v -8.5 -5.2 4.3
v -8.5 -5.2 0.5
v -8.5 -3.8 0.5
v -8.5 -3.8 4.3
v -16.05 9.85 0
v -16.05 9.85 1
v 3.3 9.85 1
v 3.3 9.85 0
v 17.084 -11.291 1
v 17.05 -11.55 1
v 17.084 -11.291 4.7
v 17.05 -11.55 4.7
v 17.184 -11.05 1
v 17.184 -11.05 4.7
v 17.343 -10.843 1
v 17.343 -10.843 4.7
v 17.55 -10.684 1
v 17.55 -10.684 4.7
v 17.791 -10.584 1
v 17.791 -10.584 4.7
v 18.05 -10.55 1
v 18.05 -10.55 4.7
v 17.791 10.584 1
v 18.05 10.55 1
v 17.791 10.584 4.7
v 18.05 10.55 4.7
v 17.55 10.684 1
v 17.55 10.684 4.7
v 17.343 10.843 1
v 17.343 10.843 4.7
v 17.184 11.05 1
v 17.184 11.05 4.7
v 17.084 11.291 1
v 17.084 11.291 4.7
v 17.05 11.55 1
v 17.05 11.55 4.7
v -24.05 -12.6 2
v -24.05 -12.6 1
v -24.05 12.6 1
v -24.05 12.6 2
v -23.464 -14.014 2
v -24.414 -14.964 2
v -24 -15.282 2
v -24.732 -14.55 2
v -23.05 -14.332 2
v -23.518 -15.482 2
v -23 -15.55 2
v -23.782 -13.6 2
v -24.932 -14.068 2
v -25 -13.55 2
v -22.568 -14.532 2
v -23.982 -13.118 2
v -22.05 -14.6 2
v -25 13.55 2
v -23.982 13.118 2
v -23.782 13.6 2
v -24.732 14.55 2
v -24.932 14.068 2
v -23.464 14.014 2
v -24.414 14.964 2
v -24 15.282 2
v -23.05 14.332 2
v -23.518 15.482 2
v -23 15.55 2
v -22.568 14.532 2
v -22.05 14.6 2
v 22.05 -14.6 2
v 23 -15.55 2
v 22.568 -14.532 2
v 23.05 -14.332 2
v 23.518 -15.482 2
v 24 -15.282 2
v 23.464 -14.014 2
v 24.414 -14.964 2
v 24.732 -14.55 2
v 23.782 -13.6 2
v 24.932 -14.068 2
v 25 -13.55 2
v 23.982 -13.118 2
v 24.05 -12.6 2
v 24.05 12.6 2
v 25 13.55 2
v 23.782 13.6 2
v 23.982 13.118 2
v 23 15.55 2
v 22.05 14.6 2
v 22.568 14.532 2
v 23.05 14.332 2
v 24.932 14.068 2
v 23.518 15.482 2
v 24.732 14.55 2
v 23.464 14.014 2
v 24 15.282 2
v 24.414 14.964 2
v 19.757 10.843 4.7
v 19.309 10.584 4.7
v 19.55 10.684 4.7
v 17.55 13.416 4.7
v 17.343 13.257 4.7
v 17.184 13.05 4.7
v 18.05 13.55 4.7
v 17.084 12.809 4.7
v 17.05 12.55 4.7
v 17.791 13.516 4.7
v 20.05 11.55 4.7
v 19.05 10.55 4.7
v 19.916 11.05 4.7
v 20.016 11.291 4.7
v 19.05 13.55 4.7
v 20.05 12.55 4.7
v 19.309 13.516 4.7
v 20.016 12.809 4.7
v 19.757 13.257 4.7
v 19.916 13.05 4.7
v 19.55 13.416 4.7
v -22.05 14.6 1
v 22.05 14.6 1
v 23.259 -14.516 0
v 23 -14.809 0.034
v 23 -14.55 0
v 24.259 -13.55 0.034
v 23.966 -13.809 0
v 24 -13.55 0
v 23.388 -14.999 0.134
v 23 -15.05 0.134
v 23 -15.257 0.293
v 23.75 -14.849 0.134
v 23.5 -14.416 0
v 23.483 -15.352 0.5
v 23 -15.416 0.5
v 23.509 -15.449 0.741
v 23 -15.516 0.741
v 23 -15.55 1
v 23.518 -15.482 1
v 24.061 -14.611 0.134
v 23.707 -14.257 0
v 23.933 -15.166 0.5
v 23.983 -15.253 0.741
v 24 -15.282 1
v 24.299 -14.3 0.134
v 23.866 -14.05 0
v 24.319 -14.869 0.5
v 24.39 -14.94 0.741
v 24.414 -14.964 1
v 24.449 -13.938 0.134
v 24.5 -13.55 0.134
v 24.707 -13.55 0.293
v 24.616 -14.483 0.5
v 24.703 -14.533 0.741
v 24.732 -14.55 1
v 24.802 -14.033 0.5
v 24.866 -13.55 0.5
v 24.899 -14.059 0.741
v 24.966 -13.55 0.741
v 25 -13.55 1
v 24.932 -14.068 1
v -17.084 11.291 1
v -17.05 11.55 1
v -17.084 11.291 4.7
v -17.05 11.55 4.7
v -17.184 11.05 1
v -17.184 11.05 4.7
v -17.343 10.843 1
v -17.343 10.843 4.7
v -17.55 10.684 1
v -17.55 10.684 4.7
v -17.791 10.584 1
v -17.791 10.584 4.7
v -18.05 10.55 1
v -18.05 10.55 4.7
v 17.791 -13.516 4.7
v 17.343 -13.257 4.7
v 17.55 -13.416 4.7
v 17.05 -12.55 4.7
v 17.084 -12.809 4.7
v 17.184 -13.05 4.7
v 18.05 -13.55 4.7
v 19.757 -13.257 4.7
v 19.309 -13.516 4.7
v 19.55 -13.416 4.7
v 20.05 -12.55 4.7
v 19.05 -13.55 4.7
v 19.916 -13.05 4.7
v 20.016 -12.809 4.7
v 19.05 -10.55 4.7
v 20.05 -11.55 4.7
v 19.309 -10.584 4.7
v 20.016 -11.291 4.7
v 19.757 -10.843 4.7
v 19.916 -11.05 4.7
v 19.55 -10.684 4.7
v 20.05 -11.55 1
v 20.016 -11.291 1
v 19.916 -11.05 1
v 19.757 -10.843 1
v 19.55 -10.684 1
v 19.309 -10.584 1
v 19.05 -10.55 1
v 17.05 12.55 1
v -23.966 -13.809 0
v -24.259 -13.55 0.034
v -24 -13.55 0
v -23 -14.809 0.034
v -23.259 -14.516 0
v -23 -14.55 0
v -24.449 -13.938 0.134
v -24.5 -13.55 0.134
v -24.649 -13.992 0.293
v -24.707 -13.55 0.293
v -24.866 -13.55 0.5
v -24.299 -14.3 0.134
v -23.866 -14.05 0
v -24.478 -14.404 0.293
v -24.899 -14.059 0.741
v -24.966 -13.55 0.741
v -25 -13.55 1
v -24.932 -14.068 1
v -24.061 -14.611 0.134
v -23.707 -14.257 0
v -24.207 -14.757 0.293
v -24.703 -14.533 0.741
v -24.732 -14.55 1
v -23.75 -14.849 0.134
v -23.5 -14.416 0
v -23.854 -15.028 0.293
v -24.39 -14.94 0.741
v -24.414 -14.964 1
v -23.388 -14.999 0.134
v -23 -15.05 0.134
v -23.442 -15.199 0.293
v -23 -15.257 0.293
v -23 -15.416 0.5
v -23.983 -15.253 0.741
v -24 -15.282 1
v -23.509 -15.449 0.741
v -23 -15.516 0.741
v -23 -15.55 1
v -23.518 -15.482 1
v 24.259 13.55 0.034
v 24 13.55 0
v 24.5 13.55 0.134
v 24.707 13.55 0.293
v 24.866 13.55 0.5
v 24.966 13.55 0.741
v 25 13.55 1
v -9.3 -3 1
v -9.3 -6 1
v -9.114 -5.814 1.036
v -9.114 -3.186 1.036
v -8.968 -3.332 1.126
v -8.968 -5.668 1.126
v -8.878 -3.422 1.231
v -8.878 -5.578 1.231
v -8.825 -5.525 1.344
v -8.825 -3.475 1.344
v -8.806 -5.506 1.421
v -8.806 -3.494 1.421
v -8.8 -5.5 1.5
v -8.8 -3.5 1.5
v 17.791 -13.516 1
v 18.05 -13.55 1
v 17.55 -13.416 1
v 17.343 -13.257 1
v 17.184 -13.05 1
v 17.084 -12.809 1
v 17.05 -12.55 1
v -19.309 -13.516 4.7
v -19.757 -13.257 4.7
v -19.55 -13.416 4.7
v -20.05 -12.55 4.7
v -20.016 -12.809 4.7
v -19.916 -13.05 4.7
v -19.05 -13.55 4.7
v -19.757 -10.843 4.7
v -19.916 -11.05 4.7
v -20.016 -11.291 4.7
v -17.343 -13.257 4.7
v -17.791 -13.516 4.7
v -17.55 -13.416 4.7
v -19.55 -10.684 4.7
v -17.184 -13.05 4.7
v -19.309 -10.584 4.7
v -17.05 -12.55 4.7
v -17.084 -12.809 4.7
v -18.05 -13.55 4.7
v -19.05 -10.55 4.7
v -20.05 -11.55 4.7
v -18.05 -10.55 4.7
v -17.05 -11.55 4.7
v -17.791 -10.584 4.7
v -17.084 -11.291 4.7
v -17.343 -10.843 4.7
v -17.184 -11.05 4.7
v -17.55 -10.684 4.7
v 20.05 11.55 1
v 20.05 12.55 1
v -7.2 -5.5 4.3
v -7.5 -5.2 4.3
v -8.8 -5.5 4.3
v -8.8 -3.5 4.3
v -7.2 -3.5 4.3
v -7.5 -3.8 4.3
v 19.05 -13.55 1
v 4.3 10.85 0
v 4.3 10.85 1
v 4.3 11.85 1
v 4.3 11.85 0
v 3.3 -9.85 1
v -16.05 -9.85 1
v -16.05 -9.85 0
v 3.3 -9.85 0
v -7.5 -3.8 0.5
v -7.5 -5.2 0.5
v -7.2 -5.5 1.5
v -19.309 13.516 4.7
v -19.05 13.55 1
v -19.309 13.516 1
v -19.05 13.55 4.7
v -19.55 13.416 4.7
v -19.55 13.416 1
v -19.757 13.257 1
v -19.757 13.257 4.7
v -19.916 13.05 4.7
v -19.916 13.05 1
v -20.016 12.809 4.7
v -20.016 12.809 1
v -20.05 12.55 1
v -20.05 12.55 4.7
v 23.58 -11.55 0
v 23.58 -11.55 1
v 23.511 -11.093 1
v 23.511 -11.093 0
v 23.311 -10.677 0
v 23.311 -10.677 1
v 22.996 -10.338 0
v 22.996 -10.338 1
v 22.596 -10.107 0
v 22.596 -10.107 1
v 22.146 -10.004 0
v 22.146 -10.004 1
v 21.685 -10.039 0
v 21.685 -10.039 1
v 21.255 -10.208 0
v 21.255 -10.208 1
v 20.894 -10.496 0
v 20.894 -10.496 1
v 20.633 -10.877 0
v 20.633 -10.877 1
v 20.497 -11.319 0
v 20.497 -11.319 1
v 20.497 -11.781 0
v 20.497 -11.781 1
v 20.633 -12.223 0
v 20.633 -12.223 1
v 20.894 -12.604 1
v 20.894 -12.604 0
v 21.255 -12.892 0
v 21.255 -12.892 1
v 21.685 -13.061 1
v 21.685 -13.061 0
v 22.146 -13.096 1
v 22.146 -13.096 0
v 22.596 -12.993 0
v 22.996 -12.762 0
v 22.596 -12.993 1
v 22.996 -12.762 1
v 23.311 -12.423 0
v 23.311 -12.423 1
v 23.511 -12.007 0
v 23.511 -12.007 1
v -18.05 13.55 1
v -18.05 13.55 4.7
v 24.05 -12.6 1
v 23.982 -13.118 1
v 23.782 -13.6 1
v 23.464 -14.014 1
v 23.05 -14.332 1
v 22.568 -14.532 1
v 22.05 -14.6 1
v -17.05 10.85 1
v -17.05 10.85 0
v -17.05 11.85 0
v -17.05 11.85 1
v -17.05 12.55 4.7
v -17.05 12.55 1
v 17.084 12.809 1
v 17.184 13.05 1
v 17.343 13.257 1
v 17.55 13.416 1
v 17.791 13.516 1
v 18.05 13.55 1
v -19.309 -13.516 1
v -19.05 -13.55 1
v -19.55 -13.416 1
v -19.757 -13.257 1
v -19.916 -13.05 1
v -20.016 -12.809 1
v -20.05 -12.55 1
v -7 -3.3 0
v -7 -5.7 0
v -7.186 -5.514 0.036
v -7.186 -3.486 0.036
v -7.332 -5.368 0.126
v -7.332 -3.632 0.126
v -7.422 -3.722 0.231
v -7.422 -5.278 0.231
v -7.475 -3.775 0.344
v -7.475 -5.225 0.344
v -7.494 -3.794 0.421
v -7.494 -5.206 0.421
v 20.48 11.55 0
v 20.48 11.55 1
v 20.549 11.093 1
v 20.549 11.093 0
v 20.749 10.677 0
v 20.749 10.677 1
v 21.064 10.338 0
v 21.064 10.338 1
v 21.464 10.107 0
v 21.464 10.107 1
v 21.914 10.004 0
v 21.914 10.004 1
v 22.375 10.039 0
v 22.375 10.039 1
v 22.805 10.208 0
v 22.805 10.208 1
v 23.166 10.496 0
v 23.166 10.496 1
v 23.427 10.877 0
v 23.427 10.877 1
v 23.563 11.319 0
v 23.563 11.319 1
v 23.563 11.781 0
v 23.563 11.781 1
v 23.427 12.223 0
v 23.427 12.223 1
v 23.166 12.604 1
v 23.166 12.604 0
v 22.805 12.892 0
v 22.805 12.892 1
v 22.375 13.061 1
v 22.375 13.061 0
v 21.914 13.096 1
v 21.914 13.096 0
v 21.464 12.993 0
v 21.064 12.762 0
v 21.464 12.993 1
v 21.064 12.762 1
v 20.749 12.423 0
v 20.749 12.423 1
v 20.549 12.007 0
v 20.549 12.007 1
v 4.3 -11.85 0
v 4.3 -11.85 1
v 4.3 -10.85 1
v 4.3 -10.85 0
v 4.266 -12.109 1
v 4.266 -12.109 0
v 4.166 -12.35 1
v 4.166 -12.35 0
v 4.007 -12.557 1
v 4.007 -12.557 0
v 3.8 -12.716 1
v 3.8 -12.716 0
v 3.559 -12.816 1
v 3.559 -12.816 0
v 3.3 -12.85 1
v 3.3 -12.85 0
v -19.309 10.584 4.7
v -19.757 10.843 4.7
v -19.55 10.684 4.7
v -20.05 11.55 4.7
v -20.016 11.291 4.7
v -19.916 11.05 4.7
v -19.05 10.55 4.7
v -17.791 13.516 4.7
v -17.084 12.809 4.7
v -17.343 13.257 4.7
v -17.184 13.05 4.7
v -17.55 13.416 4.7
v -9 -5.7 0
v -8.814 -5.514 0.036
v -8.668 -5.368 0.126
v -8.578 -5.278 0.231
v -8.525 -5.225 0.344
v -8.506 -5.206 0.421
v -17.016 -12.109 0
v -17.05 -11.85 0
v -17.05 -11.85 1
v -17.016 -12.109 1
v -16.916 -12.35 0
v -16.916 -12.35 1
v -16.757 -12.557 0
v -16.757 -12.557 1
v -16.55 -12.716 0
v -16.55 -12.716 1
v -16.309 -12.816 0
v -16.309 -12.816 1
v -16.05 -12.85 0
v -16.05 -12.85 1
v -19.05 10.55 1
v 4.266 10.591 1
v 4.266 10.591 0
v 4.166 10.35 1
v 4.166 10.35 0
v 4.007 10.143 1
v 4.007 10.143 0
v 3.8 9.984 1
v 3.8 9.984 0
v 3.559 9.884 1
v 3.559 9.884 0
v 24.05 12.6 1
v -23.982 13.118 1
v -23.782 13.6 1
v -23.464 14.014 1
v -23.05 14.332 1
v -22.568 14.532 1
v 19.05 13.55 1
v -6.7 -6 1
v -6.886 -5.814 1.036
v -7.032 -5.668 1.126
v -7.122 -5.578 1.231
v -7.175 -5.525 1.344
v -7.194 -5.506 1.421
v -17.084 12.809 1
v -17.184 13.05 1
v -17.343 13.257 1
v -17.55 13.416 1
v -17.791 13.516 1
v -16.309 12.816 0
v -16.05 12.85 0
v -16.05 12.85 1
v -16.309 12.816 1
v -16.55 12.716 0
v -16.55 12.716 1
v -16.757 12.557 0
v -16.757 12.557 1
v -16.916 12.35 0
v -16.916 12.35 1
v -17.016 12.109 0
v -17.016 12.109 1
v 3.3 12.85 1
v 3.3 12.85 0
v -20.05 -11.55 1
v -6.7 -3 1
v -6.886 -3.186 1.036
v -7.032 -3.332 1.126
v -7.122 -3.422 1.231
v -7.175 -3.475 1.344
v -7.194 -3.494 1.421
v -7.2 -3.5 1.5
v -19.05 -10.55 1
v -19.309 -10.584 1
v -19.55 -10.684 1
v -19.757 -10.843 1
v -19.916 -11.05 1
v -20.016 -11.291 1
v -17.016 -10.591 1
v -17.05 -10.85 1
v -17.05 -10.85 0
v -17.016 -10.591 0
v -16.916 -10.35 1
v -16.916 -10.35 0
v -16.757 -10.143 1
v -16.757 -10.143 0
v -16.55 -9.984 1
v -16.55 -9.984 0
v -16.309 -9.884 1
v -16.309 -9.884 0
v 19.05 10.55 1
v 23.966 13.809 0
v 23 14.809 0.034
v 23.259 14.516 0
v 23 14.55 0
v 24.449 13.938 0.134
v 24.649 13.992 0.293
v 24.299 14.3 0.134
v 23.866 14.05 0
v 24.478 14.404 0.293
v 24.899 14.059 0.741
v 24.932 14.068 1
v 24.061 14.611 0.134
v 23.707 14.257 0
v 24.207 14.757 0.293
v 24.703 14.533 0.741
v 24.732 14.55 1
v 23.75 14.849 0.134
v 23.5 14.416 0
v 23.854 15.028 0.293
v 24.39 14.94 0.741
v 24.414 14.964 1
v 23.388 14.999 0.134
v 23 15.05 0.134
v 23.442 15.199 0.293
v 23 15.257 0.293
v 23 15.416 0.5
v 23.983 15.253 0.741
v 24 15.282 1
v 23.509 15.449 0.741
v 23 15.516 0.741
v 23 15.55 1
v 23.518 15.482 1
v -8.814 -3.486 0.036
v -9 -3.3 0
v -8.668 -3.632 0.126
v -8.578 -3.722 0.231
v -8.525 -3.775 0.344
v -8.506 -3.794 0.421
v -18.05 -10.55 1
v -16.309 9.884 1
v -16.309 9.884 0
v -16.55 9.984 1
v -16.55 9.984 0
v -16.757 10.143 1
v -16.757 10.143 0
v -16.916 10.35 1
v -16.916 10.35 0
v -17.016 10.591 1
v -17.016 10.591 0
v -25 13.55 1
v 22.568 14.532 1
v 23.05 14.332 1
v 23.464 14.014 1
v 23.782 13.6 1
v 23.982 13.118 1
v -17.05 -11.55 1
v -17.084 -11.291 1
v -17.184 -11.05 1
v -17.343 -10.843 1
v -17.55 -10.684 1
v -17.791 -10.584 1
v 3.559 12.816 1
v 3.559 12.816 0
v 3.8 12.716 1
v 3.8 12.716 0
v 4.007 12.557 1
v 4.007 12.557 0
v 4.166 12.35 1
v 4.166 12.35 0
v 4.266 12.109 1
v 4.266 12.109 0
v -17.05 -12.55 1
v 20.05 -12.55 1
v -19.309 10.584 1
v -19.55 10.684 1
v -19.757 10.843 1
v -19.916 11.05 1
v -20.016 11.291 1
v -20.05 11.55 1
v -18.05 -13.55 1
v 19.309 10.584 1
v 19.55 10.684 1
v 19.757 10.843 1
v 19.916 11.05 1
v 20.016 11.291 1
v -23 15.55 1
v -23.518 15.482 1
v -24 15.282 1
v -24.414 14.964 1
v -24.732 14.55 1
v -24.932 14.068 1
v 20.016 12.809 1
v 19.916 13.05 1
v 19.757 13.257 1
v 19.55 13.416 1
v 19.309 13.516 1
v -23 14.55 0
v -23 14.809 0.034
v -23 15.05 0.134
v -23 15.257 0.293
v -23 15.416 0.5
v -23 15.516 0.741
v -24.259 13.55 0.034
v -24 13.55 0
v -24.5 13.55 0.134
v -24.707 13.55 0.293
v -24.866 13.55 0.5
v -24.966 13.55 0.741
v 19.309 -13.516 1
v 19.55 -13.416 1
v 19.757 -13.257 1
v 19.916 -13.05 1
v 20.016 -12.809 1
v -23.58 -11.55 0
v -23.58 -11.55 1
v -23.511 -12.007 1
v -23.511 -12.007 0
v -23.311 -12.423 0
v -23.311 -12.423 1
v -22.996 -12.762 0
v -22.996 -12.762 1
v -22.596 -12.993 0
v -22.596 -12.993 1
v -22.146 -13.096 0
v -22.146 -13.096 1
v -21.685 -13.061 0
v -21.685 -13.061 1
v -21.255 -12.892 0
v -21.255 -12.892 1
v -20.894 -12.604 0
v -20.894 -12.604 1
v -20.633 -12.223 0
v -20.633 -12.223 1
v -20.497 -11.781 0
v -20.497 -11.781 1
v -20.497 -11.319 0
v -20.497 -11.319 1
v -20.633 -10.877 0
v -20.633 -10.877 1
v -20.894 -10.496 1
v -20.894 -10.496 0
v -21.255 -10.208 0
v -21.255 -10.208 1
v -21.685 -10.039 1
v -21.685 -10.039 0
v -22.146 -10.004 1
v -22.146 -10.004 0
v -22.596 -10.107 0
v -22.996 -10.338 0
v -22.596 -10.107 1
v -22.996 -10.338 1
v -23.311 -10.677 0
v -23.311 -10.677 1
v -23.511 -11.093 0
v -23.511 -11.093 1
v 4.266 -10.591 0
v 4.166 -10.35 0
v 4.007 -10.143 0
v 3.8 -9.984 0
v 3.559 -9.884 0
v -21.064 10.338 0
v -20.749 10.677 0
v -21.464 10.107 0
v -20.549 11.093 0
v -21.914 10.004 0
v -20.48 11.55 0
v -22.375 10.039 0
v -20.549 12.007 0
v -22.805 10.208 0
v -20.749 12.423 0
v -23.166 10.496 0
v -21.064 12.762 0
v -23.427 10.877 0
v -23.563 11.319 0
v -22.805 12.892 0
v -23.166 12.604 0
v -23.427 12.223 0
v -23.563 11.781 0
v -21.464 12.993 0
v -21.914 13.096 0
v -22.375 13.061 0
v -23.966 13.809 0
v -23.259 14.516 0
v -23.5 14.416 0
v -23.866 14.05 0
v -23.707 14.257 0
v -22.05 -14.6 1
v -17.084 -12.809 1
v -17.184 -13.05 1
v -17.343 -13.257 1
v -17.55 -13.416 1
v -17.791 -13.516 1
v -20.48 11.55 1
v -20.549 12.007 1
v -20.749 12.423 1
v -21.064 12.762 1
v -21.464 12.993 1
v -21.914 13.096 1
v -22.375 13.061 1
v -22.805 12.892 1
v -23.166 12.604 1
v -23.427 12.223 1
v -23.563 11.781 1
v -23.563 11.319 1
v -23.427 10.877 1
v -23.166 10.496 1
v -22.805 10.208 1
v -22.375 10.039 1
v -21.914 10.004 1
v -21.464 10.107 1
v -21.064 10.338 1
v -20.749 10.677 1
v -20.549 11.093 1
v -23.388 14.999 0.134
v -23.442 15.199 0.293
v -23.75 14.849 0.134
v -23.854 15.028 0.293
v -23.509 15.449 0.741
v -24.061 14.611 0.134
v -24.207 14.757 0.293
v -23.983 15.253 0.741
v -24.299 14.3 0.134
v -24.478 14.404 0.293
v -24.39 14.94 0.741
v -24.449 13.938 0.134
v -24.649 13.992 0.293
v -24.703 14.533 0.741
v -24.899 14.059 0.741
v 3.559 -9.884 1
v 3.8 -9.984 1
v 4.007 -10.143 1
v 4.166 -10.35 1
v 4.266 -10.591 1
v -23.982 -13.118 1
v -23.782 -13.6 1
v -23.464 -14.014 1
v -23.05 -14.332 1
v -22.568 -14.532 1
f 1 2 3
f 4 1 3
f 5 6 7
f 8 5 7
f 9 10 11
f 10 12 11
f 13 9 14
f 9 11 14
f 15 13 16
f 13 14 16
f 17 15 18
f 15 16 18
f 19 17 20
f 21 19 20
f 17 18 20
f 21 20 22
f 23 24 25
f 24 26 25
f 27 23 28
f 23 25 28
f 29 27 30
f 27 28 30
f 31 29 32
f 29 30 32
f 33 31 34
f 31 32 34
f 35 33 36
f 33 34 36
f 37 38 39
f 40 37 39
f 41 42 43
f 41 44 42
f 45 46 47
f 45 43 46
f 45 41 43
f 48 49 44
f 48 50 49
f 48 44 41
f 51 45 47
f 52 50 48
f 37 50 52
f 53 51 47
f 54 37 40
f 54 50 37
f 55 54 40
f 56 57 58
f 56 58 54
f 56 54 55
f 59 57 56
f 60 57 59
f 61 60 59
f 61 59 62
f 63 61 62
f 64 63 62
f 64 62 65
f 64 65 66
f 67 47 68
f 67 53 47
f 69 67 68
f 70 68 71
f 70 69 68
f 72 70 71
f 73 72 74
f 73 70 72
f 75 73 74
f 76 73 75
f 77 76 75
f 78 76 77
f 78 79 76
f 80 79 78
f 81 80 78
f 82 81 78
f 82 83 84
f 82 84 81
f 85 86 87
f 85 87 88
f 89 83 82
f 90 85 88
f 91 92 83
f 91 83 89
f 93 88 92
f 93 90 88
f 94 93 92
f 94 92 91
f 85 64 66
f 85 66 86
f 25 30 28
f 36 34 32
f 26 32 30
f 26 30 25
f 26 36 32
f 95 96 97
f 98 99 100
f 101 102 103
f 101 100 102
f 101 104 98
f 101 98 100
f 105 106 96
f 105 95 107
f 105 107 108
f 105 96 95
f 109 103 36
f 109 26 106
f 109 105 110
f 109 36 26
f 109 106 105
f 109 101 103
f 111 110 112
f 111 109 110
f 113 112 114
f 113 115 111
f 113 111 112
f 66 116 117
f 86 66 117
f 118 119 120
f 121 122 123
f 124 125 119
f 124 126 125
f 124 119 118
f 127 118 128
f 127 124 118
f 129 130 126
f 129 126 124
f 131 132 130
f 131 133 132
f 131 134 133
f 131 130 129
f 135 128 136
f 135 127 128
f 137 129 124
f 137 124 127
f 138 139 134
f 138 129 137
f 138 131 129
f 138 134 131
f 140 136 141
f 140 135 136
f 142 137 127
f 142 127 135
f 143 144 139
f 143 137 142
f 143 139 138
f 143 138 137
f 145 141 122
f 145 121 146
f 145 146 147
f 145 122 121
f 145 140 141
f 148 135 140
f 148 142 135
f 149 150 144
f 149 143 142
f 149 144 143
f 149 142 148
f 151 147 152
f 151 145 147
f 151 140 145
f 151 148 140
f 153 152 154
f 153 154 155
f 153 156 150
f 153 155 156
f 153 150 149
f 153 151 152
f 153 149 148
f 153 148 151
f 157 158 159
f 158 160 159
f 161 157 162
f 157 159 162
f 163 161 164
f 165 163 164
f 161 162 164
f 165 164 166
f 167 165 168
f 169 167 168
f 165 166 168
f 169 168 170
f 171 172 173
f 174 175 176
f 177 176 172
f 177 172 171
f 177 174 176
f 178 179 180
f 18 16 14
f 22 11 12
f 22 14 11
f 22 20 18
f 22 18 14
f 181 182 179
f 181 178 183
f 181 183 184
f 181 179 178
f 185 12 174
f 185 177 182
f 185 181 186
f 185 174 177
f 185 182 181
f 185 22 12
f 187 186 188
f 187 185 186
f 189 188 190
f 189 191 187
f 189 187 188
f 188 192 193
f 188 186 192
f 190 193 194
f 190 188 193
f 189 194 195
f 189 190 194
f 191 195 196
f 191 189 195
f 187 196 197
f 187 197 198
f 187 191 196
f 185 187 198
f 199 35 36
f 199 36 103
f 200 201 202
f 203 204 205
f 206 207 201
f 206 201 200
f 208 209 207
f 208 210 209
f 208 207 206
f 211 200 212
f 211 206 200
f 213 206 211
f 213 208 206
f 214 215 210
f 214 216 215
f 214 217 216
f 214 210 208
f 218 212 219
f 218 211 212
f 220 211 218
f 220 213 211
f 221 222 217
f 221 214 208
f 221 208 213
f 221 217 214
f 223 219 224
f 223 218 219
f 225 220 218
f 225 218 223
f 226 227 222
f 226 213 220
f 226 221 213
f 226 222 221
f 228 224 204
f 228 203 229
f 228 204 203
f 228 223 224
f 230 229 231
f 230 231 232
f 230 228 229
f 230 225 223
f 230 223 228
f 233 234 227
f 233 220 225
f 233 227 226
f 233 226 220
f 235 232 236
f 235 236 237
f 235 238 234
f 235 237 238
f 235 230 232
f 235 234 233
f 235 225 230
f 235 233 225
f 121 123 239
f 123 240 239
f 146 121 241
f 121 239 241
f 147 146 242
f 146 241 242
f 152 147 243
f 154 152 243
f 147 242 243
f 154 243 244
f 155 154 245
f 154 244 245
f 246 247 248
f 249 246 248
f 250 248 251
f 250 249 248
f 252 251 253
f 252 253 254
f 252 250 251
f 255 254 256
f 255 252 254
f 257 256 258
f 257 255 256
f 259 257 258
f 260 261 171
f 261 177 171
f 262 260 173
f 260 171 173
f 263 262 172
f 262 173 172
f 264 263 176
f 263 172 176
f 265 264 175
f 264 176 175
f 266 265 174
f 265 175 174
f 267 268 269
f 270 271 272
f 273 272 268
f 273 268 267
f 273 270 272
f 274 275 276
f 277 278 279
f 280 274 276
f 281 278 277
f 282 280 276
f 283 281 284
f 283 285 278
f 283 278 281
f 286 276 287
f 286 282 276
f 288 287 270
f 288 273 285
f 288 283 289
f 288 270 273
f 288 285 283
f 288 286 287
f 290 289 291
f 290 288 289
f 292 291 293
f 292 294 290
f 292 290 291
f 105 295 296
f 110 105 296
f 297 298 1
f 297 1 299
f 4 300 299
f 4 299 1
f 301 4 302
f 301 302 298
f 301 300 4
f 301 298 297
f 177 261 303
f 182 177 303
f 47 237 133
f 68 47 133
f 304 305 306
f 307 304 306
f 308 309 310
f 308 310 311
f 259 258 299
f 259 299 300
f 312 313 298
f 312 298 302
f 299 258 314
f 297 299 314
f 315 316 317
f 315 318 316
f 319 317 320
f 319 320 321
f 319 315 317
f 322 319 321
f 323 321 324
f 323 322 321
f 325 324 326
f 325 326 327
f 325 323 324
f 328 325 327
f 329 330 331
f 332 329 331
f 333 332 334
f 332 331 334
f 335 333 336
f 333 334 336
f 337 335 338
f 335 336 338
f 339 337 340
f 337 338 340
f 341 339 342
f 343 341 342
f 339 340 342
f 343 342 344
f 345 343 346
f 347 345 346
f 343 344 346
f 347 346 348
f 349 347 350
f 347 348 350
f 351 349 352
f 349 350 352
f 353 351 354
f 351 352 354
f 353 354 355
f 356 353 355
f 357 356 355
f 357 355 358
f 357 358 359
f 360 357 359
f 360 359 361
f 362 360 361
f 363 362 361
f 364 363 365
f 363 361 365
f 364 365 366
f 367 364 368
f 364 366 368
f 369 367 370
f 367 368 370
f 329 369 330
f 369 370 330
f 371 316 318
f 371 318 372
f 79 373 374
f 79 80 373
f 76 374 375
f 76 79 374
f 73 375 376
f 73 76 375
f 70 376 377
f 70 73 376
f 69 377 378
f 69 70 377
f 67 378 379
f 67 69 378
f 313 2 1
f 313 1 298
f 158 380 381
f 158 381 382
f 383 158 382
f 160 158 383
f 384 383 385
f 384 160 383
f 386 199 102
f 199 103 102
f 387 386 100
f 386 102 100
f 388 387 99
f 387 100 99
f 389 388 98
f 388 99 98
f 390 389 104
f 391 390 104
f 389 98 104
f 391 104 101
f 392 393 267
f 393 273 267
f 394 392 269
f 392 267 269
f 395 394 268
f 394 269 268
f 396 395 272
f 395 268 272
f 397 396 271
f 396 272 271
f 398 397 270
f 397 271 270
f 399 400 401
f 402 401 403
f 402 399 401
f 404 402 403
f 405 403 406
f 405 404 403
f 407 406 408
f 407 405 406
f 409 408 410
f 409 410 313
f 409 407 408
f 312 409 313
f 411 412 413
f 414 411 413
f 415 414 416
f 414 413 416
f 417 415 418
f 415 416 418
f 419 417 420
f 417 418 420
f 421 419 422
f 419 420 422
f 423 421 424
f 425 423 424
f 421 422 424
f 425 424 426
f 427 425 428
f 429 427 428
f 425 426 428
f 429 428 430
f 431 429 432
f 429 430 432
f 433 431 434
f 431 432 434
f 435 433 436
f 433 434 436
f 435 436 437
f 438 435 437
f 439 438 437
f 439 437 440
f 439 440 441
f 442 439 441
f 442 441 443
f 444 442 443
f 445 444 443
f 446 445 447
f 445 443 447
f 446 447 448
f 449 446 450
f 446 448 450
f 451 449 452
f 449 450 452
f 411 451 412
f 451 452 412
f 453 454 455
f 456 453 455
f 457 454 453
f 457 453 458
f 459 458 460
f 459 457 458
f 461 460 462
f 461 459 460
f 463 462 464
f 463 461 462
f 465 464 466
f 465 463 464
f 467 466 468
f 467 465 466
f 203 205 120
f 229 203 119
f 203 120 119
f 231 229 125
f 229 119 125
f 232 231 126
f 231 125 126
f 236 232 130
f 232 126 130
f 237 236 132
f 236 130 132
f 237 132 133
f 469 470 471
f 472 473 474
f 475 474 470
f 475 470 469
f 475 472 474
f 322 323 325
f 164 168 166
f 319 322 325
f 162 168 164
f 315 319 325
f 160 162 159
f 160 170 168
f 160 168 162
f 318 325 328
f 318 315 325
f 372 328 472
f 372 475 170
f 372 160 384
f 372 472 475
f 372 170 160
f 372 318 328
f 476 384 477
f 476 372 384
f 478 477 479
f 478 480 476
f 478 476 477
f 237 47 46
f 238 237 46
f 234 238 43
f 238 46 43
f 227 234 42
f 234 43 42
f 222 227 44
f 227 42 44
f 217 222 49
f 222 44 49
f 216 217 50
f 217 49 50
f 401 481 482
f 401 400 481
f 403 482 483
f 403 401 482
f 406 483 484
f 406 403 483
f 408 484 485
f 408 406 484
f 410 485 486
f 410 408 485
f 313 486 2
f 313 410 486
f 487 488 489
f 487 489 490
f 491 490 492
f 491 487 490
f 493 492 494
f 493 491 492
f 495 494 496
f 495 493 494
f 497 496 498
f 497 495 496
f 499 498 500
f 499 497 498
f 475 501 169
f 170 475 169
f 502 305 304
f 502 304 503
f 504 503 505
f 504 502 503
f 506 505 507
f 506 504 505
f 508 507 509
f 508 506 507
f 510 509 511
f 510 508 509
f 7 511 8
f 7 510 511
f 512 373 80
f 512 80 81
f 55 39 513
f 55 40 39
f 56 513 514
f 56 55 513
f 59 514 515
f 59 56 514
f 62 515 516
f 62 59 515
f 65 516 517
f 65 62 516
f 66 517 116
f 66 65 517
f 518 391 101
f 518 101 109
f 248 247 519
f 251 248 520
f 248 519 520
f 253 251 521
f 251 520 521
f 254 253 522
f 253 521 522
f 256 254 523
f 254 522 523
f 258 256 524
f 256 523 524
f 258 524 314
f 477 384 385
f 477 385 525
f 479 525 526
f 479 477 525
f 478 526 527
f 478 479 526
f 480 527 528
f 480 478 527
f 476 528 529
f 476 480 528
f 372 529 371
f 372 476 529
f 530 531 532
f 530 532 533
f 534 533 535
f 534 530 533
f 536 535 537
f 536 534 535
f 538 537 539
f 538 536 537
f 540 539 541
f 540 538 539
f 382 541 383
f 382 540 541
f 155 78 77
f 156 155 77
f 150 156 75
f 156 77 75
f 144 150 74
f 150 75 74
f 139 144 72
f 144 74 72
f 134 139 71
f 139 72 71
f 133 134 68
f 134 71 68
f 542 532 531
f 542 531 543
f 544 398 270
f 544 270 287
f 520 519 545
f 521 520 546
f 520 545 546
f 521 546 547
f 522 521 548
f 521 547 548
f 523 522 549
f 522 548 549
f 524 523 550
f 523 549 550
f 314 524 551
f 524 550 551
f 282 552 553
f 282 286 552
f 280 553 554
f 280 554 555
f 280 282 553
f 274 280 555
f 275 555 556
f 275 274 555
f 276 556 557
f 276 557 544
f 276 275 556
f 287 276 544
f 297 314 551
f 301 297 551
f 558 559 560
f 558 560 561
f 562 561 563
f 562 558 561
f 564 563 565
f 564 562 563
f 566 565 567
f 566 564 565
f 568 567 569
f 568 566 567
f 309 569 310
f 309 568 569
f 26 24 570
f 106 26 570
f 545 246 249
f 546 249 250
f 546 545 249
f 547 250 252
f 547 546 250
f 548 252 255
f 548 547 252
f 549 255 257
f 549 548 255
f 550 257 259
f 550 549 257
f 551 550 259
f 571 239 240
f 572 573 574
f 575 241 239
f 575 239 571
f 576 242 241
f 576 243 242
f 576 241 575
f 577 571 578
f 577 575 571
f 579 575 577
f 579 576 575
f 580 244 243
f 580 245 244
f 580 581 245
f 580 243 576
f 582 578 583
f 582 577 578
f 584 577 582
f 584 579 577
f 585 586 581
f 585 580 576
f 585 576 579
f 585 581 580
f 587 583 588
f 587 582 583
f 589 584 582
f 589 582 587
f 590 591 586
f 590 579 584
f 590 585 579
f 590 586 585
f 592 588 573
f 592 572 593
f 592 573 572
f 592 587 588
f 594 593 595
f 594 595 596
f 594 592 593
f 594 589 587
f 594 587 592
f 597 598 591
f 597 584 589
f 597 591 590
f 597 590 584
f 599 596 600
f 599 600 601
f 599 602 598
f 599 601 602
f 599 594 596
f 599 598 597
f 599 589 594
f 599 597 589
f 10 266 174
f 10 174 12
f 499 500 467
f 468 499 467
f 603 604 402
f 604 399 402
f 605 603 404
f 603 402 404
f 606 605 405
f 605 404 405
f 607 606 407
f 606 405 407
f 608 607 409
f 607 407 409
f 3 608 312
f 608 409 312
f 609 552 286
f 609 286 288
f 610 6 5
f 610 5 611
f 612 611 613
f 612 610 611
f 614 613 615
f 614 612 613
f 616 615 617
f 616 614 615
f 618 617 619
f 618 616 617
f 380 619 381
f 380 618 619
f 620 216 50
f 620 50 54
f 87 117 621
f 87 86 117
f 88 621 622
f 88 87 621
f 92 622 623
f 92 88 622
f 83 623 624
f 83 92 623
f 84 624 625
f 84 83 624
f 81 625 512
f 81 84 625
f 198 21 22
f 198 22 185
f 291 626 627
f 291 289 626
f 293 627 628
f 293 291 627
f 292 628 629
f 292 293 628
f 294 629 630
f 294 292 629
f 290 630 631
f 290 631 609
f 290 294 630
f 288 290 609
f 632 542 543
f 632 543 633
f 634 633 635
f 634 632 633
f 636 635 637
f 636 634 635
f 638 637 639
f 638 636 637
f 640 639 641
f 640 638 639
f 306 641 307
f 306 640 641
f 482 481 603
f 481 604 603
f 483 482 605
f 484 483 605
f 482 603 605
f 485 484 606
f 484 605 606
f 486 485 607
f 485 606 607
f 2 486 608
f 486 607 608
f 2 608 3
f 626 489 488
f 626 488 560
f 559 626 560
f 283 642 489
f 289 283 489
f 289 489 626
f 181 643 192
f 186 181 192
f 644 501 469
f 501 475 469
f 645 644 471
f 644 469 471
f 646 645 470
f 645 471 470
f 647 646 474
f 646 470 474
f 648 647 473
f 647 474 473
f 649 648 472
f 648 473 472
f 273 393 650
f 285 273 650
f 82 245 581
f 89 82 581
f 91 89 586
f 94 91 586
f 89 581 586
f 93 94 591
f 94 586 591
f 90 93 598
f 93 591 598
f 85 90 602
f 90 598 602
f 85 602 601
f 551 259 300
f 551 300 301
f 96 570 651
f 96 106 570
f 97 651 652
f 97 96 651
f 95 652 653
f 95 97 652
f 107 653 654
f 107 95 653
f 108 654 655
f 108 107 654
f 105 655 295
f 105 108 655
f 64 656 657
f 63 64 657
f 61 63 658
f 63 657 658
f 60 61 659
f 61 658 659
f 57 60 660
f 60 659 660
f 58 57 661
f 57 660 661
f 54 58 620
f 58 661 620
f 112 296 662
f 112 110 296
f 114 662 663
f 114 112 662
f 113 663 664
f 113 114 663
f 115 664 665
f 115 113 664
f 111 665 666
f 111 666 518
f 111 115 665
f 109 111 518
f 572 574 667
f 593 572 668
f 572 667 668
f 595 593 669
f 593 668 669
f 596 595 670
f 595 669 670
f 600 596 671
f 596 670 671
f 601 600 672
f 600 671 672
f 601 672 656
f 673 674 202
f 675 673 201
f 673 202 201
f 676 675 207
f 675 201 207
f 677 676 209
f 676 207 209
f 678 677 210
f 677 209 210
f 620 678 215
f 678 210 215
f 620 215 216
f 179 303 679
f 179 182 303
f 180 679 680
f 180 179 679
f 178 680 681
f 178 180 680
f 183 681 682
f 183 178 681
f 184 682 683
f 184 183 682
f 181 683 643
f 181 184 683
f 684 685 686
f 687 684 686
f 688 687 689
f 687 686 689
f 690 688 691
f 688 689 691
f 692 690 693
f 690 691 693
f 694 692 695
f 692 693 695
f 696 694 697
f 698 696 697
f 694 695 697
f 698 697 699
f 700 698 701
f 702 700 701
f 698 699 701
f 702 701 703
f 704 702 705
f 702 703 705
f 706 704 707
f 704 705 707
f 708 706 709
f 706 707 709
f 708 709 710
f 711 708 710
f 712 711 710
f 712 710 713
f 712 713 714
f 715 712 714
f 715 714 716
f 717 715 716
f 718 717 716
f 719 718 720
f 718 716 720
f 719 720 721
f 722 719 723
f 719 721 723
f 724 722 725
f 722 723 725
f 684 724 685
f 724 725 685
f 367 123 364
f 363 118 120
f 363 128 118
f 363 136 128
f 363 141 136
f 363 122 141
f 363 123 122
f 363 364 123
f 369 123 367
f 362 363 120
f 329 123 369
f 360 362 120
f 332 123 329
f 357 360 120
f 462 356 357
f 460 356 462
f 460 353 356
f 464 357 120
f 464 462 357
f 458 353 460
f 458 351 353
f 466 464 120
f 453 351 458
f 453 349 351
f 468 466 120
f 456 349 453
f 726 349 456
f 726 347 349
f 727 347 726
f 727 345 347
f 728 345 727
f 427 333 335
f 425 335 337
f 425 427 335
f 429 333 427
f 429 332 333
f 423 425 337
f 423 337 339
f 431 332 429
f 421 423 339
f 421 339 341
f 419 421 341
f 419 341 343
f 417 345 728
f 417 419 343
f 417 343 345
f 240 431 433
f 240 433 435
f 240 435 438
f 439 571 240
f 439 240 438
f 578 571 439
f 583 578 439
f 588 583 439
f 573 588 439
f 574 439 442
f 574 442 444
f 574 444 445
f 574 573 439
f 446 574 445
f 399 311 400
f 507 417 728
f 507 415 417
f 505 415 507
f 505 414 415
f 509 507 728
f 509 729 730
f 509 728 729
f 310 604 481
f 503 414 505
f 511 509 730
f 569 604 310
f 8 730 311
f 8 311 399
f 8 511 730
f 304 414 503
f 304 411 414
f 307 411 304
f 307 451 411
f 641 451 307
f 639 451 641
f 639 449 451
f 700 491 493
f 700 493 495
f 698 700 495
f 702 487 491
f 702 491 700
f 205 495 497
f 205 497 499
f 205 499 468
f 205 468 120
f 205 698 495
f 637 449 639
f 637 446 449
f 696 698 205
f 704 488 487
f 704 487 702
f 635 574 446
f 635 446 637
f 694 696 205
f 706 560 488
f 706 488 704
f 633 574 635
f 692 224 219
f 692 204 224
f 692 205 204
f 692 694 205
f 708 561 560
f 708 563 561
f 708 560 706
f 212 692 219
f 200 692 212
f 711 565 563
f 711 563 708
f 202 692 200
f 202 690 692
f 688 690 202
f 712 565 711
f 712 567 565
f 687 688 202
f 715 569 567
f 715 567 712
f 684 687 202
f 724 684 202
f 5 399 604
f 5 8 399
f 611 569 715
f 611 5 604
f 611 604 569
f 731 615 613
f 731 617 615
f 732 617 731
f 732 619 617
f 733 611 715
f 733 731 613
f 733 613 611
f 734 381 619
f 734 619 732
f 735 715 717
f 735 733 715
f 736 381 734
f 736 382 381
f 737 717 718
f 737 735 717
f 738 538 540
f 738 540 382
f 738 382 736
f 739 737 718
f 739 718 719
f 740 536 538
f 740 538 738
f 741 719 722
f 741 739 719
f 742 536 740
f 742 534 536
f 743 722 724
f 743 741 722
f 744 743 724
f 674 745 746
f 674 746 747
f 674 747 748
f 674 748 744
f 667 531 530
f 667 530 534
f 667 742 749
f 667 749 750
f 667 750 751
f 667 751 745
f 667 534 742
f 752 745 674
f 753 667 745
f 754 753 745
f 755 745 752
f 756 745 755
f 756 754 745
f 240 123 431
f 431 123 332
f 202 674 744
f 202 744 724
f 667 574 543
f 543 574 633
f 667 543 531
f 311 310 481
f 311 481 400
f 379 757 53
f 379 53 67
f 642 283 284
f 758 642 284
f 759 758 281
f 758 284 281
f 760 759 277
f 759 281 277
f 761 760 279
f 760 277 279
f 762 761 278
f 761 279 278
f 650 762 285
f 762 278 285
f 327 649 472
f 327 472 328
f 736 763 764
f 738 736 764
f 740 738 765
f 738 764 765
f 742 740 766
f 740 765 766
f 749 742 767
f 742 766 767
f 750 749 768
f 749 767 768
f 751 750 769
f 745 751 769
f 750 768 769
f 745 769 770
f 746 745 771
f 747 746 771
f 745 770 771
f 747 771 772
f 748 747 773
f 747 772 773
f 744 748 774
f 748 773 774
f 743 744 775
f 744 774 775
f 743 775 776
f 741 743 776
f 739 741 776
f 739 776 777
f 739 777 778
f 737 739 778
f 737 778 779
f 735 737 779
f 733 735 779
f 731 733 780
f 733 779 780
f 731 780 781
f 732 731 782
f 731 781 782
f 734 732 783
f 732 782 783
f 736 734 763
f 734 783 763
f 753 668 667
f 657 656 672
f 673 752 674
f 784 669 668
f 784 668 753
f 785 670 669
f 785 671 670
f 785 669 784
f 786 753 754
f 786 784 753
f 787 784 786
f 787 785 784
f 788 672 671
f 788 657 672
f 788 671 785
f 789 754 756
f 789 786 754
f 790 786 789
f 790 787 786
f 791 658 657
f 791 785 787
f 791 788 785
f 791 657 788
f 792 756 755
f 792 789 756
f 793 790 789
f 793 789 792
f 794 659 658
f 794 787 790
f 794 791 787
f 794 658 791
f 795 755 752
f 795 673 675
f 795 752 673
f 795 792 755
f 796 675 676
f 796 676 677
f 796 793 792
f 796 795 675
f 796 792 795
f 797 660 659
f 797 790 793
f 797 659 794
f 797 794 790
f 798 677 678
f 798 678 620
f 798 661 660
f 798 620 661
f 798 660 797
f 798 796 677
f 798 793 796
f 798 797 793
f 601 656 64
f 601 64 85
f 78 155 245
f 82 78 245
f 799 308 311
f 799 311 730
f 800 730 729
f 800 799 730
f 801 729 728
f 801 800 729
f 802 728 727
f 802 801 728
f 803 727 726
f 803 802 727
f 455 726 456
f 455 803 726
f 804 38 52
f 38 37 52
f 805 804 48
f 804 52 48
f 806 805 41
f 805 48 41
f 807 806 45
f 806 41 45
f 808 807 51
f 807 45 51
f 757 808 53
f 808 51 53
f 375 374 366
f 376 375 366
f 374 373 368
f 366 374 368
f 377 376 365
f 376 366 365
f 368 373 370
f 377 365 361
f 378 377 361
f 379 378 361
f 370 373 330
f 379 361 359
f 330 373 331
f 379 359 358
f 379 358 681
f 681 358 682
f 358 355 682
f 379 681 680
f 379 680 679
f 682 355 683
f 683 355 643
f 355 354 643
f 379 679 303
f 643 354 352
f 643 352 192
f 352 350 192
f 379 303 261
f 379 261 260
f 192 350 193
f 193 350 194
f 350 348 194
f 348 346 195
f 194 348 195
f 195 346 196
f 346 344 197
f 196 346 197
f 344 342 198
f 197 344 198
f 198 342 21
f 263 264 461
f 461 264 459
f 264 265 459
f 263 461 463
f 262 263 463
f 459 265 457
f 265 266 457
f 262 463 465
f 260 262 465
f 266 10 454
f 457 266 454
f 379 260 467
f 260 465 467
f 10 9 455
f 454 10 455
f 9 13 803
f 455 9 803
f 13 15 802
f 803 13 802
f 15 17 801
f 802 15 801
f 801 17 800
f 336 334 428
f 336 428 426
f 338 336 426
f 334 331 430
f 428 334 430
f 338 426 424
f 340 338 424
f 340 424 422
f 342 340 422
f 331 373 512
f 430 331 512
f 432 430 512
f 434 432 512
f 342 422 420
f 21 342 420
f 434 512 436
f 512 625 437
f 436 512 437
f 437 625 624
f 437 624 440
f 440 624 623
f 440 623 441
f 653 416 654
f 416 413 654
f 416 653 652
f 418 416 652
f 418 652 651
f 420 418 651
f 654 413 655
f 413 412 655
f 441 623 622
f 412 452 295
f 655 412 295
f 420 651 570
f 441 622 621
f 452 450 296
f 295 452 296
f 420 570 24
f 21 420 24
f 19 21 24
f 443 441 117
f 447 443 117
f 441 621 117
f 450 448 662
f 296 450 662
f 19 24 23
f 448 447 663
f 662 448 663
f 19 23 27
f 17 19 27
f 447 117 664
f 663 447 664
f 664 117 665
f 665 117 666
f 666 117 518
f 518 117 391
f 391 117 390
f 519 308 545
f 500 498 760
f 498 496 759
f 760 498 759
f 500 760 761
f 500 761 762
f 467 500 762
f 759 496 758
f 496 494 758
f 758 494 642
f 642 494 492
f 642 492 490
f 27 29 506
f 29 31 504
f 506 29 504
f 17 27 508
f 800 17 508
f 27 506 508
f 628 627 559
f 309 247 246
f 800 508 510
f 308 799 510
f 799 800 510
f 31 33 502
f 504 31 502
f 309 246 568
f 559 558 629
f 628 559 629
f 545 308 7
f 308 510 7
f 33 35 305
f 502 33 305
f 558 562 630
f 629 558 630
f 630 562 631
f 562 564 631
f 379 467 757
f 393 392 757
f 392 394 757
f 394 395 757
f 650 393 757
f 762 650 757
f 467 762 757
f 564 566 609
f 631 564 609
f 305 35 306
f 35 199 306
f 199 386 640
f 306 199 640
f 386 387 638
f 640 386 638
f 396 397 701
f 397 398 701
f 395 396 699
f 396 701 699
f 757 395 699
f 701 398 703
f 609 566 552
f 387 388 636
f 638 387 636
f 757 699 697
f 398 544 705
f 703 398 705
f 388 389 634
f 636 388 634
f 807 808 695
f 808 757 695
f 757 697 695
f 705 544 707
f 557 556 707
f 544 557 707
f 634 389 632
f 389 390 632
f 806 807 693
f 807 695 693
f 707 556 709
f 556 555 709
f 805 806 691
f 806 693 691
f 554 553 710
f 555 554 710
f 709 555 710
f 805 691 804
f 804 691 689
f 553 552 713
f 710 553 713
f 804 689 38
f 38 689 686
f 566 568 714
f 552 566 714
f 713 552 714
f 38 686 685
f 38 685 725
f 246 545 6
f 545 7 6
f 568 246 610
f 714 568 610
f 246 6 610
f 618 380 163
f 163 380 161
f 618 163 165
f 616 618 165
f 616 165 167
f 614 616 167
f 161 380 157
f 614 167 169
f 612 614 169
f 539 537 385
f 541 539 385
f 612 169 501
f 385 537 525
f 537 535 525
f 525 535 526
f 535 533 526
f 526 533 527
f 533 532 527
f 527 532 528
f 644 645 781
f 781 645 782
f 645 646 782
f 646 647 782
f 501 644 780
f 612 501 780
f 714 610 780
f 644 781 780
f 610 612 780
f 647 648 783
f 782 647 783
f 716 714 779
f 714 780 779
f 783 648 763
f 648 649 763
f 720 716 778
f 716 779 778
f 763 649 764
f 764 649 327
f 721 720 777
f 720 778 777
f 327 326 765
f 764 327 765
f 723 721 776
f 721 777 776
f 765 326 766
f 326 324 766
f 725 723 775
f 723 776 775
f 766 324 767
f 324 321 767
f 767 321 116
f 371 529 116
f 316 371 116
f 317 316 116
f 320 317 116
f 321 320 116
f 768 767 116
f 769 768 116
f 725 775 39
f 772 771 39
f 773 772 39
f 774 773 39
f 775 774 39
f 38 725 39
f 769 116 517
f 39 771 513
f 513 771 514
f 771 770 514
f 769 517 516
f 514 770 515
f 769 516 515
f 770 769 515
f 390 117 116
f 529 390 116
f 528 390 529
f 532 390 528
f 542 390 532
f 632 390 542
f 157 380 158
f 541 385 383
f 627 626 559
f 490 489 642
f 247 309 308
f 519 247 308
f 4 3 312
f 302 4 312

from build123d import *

# Parameters (mm, degrees)
SKETCH1_W           = 50
SKETCH1_H           = 31.1
BOSS_EXTRUDE1_DEPTH = 1
SKETCH2_W           = 50
SKETCH2_H           = 31.1
SKETCH2_W_2         = 48.1
SKETCH2_H_2         = 29.2
BOSS_EXTRUDE2_DEPTH = 1
SKETCH3_W           = 3
SKETCH3_H           = 3
BOSS_EXTRUDE3_DEPTH = 3.7
SKETCH4_R           = 1.55
CUT_EXTRUDE1_DEPTH  = 1
SKETCH5_W           = 21.35
SKETCH5_H           = 3
SKETCH5_W_2         = 1
SKETCH5_H_2         = 1.4
CUT_EXTRUDE2_DEPTH  = 1
SKETCH6_W           = 1.6
SKETCH6_H           = 2
SKETCH6_W_2         = 1
SKETCH6_H_2         = 1.4
BOSS_EXTRUDE4_DEPTH = 3.3
FILLET1_R           = 2
FILLET2_R           = 1
FILLET3_R           = 1
FILLET4_R           = 1
FILLET5_R           = 0.5
FILLET6_R           = 0.5


with BuildPart() as part:
    # Sketch1 → Boss-Extrude1 (new body)
    with BuildSketch(Plane.XY):
        Rectangle(SKETCH1_W, SKETCH1_H)
    extrude(amount=BOSS_EXTRUDE1_DEPTH)

    # Sketch2 → Boss-Extrude2 (add)
    with BuildSketch(Plane.XY.offset(1)):
        Rectangle(SKETCH2_W, SKETCH2_H)
        Rectangle(SKETCH2_W_2, SKETCH2_H_2, mode=Mode.SUBTRACT)
    extrude(amount=BOSS_EXTRUDE2_DEPTH)

    # Sketch3 → Boss-Extrude3 (add)
    with BuildSketch(Plane.XY.offset(1)):
        with Locations((18.55, 12.05)):
            Rectangle(SKETCH3_W, SKETCH3_H)
        with Locations((-18.55, 12.05)):
            Rectangle(SKETCH3_W, SKETCH3_H)
        with Locations((18.55, -12.05)):
            Rectangle(SKETCH3_W, SKETCH3_H)
        with Locations((-18.55, -12.05)):
            Rectangle(SKETCH3_W, SKETCH3_H)
    extrude(amount=BOSS_EXTRUDE3_DEPTH)

    # Sketch4 → Cut-Extrude1 (cut)
    with BuildSketch(Plane.XY.offset(1)):
        with Locations((-22.03, 11.55)):
            Circle(SKETCH4_R)
        with Locations(Location((22.03, 11.55, 0), (0, 0, 180))):
            Circle(SKETCH4_R)
        with Locations(Location((-22.03, -11.55, 0), (0, 0, 180))):
            Circle(SKETCH4_R)
        with Locations((22.03, -11.55)):
            Circle(SKETCH4_R)
    extrude(amount=-CUT_EXTRUDE1_DEPTH, mode=Mode.SUBTRACT)

    # Sketch5 → Cut-Extrude2 (cut)
    with BuildSketch(Plane.XY.offset(1)):
        with Locations((-6.375, 11.35)):
            Rectangle(SKETCH5_W, SKETCH5_H)
        with Locations((-6.375, -11.35)):
            Rectangle(SKETCH5_W, SKETCH5_H)
        with Locations((-8, -4.5)):
            Rectangle(SKETCH5_W_2, SKETCH5_H_2)
    extrude(amount=-CUT_EXTRUDE2_DEPTH, mode=Mode.SUBTRACT)

    # Sketch6 → Boss-Extrude4 (add)
    with BuildSketch(Plane.XY.offset(1)):
        with Locations((-8, -4.5)):
            Rectangle(SKETCH6_W, SKETCH6_H)
        with Locations((-8, -4.5)):
            Rectangle(SKETCH6_W_2, SKETCH6_H_2, mode=Mode.SUBTRACT)
    extrude(amount=BOSS_EXTRUDE4_DEPTH)

    # Fillet1
    fillet1_edges = [part.edges().sort_by_distance(p)[0] for p in [
        (24.05, 14.6, 1.5),
        (-24.05, 14.6, 1.5),
        (-24.05, -14.6, 1.5),
        (24.05, -14.6, 1.5),
        (25, -15.55, 1),
        (-25, -15.55, 1),
        (-25, 15.55, 1),
        (25, 15.55, 1),
    ]]
    fillet(fillet1_edges, radius=FILLET1_R)

    # Fillet2
    fillet2_edges = [part.edges().sort_by_distance(p)[0] for p in [
        (-20.05, -13.55, 2.85),
        (-17.05, -13.55, 2.85),
        (-17.05, -10.55, 2.85),
        (-20.05, -10.55, 2.85),
        (20.05, 13.55, 2.85),
        (17.05, 13.55, 2.85),
        (17.05, 10.55, 2.85),
        (20.05, 10.55, 2.85),
        (-20.05, 10.55, 2.85),
        (-17.05, 10.55, 2.85),
        (-17.05, 13.55, 2.85),
        (20.05, -13.55, 2.85),
        (20.05, -10.55, 2.85),
        (17.05, -10.55, 2.85),
        (17.05, -13.55, 2.85),
        (-20.05, 13.55, 2.85),
    ]]
    fillet(fillet2_edges, radius=FILLET2_R)

    # Fillet3
    fillet3_edges = [part.edges().sort_by_distance(p)[0] for p in [
        (25, 0, 0),
        (0, -15.55, 0),
        (-25, 0, 0),
        (0, 15.55, 0),
        (-24.414213562, 14.964213562, 0),
        (24.414213562, 14.964213562, 0),
        (-24.414213562, -14.964213562, 0),
        (24.414213562, -14.964213562, 0),
    ]]
    fillet(fillet3_edges, radius=FILLET3_R)

    # Fillet4
    # the kernel refuses this fillet: 1 mm, written as the material it adds along each edge
    with BuildSketch(Plane(origin=(4.3, -9.85, 1), x_dir=(-1, 0, 0), z_dir=(0, 0, -1)), Plane(origin=(-17.05, -9.85, 1), x_dir=(0, -1, 0), z_dir=(0, 0, -1)), Plane(origin=(4.3, 12.85, 1), x_dir=(-1, 0, 0), z_dir=(0, 0, -1)), Plane(origin=(4.3, 9.85, 1), x_dir=(0, 1, 0), z_dir=(0, 0, -1))) as fillet4_piece_1:
        with BuildLine():
            CenterArc((FILLET4_R, -FILLET4_R), FILLET4_R, 90, 90)
            Line((0, -FILLET4_R), (0, 0))
            Line((0, 0), (FILLET4_R, 0))
        make_face()
    extrude(amount=1)
    with BuildSketch(Plane(origin=(4.3, -12.85, 1), x_dir=(-1, 0, 0), z_dir=(0, 0, -1)), Plane(origin=(-17.05, 9.85, 1), x_dir=(0, 1, 0), z_dir=(0, 0, -1))) as fillet4_piece_2:
        with BuildLine():
            CenterArc((FILLET4_R, FILLET4_R), FILLET4_R, 180, 90)
            Line((0, FILLET4_R), (0, 0))
            Line((0, 0), (FILLET4_R, 0))
        make_face()
    extrude(amount=1)
    with BuildSketch(Plane(origin=(-17.096060799, -12.85, 0), x_dir=(0.04601201496386327, 0.9989408863786512, 0), z_dir=(0, 0, 1))) as fillet4_piece_3:
        with BuildLine():
            CenterArc((1.047072251, -0.998940886), FILLET4_R, 92.637225371, 90)
            Line((0.048131365, -1.044952901), (-0.051762724, -1.049554103))
            Line((-0.051762724, -1.049554103), (-0.099894089, -0.004601201))
            Line((-0.099894089, -0.004601201), (0.02557896, 0.096673248))
            ThreePointArc((0.02557896, 0.096673248), (0.297200415, 0.067685678), (0.996459035, 0.099894089))
            Line((0.996459035, 0.099894089), (1.001060237, 0))
        make_face()
    extrude(amount=1)
    with BuildSketch(Plane(origin=(-17.096060799, 12.85, 0), x_dir=(1, 0, 0), z_dir=(0, 0, 1))) as fillet4_piece_4:
        with BuildLine():
            CenterArc((1.046060799, -1), FILLET4_R, 90, 90)
            Line((0.046060799, -1), (-0.053939201, -1))
            ThreePointArc((-0.053939201, -1), (-0.053939201, -0.3), (-0.09539392, -0.03))
            Line((-0.09539392, -0.03), (0, 0.1))
            Line((0, 0.1), (1.046060799, 0.1))
            Line((1.046060799, 0.1), (1.046060799, 0))
        make_face()
    extrude(amount=1)

    # Fillet5
    fillet5_edges = [part.edges().sort_by_distance(p)[0] for p in [
        (-7.2, -4.5, 1),
        (-8, -3.5, 1),
        (-8.8, -4.5, 1),
        (-8, -5.5, 1),
    ]]
    fillet(fillet5_edges, radius=FILLET5_R)

    # Fillet6
    fillet6_edges = [part.edges().sort_by_distance(p)[0] for p in [
        (-8, -5.2, 0),
        (-7.5, -4.5, 0),
        (-8, -3.8, 0),
        (-8.5, -4.5, 0),
    ]]
    fillet(fillet6_edges, radius=FILLET6_R)


solid = part.part
